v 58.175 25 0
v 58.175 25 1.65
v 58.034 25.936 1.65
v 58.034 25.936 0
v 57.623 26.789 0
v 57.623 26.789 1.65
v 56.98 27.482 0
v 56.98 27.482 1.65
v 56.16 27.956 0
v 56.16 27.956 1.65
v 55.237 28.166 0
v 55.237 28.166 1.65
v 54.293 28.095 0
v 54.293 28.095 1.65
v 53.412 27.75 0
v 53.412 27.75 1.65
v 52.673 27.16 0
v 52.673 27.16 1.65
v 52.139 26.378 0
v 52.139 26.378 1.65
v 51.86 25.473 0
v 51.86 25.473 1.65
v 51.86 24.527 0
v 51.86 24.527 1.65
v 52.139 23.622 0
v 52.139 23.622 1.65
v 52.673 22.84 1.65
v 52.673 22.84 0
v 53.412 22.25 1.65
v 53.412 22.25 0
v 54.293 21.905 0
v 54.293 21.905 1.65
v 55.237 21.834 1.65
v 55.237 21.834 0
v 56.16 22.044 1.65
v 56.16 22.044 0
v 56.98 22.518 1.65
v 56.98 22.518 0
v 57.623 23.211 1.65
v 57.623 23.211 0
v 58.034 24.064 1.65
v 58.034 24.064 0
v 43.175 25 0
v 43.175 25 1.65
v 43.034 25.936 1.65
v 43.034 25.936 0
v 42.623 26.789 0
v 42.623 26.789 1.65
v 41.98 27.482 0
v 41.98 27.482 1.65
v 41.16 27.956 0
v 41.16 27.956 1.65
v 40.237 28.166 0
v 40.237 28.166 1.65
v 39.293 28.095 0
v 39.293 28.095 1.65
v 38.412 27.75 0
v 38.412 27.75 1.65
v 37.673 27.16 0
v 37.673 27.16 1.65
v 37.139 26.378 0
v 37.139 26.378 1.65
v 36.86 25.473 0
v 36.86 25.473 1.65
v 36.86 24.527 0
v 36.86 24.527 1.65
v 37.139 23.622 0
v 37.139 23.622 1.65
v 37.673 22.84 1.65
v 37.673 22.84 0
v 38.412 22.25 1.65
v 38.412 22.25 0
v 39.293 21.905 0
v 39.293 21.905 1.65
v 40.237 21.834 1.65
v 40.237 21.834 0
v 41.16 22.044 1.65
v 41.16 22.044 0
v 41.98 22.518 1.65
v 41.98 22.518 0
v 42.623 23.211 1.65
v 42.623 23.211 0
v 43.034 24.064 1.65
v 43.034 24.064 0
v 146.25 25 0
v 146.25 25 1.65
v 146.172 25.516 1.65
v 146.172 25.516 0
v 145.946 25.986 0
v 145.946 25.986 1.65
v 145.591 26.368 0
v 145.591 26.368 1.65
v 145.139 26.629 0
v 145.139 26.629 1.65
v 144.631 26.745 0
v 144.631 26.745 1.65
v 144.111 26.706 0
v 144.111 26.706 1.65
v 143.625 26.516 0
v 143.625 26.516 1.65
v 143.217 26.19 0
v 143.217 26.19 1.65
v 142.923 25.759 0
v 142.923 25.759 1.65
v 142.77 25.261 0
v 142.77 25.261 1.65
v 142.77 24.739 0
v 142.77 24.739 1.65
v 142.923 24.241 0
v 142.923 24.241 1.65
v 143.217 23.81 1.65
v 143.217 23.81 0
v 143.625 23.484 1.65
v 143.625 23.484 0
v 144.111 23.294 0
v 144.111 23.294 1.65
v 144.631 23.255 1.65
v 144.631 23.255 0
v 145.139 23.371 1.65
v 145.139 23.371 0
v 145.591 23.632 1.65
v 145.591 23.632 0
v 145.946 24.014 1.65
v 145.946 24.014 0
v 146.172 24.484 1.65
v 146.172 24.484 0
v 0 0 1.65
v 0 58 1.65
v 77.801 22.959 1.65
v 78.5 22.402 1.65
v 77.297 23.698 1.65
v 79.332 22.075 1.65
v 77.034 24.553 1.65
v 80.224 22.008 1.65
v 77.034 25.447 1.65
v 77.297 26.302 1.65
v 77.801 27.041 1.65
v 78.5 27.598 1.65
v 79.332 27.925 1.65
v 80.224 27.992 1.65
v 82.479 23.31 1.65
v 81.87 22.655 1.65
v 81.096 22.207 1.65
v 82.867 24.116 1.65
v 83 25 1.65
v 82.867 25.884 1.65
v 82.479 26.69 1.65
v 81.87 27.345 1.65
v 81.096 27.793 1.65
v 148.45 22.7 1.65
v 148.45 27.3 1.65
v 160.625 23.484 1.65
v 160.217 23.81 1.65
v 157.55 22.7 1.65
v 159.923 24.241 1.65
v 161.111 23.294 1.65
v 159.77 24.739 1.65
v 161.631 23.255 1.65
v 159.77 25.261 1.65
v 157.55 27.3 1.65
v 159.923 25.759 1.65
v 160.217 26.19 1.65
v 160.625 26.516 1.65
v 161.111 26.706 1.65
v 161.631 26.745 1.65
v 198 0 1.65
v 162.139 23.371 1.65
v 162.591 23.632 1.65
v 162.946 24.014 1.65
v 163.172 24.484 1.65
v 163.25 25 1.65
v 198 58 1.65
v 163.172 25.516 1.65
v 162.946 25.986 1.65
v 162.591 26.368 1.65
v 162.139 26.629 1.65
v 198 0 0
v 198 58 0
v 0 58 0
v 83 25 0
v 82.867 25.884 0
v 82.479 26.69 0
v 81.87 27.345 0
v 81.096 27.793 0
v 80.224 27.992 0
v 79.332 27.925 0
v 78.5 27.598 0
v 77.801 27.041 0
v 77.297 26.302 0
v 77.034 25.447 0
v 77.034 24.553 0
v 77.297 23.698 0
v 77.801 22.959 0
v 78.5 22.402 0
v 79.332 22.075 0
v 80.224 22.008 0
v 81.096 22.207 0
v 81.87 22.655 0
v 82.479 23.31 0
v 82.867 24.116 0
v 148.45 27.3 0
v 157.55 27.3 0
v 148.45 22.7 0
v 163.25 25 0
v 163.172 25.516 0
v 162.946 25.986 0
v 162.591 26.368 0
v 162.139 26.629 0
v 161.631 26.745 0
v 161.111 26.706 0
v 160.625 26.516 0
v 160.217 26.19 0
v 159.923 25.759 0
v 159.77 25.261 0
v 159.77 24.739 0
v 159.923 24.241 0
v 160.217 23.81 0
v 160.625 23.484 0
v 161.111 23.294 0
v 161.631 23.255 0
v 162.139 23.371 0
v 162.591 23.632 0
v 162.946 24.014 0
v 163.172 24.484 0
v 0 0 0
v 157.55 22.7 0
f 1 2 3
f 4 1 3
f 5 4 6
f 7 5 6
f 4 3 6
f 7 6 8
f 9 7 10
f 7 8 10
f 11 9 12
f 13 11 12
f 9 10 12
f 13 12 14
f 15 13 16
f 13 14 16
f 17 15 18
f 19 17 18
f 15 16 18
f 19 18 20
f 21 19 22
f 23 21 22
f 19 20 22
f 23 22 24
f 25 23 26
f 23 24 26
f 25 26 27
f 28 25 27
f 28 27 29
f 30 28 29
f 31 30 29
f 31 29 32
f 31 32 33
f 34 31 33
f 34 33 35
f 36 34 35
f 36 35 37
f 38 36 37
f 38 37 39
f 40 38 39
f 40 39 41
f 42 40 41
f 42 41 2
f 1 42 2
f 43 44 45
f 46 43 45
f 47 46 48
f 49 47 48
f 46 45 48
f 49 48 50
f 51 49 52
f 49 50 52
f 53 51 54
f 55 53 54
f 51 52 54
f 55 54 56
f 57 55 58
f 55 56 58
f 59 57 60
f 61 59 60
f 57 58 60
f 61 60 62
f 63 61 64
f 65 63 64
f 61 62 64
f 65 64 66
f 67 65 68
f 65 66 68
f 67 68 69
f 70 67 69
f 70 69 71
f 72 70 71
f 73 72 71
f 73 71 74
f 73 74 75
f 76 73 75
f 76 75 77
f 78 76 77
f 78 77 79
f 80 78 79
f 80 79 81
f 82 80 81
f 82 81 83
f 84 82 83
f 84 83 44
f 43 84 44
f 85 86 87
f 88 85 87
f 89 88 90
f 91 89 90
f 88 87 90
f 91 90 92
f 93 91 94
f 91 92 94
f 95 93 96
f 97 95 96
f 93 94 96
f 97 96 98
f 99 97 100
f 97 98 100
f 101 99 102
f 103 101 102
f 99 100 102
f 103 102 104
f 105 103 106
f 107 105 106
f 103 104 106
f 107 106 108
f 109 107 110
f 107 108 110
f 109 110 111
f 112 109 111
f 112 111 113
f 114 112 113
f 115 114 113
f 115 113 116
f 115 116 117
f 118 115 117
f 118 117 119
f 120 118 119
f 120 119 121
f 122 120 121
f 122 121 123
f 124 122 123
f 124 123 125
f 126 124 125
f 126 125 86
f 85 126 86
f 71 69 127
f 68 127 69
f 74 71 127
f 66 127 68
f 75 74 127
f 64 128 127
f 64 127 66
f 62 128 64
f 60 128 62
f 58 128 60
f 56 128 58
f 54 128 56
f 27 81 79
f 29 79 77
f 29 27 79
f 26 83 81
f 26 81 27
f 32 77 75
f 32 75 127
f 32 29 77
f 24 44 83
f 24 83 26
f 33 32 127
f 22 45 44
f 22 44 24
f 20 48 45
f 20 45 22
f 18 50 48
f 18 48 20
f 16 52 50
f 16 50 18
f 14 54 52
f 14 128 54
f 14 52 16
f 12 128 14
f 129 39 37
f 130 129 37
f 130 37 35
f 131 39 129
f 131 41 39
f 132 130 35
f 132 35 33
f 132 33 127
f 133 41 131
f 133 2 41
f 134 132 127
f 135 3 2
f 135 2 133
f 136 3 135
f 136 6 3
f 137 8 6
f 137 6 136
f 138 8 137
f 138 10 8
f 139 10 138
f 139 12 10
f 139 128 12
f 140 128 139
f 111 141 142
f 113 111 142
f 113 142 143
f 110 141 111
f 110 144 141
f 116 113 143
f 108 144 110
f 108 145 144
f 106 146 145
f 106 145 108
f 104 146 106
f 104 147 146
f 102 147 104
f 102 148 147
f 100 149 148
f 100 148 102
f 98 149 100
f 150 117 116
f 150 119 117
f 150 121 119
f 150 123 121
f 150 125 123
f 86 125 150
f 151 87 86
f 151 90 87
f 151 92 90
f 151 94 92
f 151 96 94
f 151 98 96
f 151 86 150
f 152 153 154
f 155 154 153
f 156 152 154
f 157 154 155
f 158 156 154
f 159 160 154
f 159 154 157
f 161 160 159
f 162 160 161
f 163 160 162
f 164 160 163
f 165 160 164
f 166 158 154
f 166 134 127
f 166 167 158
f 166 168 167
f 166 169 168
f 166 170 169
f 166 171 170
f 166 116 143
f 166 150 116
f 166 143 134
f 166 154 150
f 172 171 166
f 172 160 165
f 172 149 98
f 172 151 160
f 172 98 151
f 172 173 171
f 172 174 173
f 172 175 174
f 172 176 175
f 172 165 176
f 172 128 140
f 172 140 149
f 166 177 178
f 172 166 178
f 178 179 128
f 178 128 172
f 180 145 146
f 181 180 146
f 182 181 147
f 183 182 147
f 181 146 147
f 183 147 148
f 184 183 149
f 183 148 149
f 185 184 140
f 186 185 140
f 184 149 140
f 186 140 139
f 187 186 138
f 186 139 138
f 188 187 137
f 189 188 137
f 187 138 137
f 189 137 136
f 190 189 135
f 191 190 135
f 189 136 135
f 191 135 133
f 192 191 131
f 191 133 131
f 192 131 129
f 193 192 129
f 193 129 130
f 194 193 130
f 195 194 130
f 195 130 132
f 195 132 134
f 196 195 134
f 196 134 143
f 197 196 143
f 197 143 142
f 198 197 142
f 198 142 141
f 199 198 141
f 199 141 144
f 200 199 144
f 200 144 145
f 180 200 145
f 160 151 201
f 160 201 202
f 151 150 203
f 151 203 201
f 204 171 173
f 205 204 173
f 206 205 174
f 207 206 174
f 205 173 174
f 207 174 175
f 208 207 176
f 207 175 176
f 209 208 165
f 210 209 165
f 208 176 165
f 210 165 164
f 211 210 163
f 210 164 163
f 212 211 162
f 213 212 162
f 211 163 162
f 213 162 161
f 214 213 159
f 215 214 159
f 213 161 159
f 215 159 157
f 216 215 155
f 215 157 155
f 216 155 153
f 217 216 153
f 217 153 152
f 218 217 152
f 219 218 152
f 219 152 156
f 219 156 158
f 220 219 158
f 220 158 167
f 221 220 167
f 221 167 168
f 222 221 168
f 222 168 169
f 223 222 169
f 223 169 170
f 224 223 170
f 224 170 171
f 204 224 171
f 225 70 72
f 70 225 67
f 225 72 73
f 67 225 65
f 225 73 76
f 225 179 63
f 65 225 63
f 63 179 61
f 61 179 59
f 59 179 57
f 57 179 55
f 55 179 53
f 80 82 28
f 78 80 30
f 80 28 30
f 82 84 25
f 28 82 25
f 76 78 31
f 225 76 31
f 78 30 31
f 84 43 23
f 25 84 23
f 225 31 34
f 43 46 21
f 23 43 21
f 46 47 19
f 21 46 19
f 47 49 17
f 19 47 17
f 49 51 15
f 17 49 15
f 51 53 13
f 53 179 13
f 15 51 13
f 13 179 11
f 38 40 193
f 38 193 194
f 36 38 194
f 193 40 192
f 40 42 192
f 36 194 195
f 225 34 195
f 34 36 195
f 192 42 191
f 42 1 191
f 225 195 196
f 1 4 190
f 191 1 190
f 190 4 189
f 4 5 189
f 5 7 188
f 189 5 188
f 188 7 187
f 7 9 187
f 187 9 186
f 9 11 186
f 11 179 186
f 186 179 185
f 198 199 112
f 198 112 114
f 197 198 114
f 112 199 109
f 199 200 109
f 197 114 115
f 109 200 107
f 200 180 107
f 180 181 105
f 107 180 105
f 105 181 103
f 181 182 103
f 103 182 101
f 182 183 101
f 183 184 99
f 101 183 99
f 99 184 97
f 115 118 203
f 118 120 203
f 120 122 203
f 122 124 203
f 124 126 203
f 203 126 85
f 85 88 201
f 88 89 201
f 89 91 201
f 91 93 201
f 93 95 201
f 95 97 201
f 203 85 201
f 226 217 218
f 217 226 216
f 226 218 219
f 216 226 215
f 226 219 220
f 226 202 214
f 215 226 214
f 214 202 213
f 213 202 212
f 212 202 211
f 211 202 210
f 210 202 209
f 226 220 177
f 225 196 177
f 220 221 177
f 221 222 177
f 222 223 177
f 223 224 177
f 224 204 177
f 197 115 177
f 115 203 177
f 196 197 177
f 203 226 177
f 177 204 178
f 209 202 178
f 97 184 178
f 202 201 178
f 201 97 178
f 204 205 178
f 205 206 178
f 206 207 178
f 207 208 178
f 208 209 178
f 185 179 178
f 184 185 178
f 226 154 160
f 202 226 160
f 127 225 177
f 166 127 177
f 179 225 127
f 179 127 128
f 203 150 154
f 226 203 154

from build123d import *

# Parameters (mm, degrees)
SKETCH_W      = 198
SKETCH_H      = 58
PAD_DEPTH     = 1.65
SKETCH001_R   = 1.75
SKETCH001_R_2 = 3
SKETCH001_R_3 = 3.175
SKETCH001_W   = 9.1
SKETCH001_H   = 4.6
POCKET_DEPTH  = 5


with BuildPart() as part:
    # Sketch → Pad (new body)
    with BuildSketch(Plane.XY):
        with Locations((99, 29)):
            Rectangle(SKETCH_W, SKETCH_H)
    extrude(amount=PAD_DEPTH)

    # Sketch001 (on Face6 of Pad) → Pocket (cut)
    with BuildSketch(Plane.XY.offset(1.65)):
        with Locations((144.5, 25)):
            Circle(SKETCH001_R)
        with Locations((161.5, 25)):
            Circle(SKETCH001_R)
        with Locations((80, 25)):
            Circle(SKETCH001_R_2)
        with Locations((40, 25)):
            Circle(SKETCH001_R_3)
        with Locations((55, 25)):
            Circle(SKETCH001_R_3)
        with Locations((153, 25)):
            Rectangle(SKETCH001_W, SKETCH001_H)
    extrude(amount=-POCKET_DEPTH, mode=Mode.SUBTRACT)


solid = part.part
